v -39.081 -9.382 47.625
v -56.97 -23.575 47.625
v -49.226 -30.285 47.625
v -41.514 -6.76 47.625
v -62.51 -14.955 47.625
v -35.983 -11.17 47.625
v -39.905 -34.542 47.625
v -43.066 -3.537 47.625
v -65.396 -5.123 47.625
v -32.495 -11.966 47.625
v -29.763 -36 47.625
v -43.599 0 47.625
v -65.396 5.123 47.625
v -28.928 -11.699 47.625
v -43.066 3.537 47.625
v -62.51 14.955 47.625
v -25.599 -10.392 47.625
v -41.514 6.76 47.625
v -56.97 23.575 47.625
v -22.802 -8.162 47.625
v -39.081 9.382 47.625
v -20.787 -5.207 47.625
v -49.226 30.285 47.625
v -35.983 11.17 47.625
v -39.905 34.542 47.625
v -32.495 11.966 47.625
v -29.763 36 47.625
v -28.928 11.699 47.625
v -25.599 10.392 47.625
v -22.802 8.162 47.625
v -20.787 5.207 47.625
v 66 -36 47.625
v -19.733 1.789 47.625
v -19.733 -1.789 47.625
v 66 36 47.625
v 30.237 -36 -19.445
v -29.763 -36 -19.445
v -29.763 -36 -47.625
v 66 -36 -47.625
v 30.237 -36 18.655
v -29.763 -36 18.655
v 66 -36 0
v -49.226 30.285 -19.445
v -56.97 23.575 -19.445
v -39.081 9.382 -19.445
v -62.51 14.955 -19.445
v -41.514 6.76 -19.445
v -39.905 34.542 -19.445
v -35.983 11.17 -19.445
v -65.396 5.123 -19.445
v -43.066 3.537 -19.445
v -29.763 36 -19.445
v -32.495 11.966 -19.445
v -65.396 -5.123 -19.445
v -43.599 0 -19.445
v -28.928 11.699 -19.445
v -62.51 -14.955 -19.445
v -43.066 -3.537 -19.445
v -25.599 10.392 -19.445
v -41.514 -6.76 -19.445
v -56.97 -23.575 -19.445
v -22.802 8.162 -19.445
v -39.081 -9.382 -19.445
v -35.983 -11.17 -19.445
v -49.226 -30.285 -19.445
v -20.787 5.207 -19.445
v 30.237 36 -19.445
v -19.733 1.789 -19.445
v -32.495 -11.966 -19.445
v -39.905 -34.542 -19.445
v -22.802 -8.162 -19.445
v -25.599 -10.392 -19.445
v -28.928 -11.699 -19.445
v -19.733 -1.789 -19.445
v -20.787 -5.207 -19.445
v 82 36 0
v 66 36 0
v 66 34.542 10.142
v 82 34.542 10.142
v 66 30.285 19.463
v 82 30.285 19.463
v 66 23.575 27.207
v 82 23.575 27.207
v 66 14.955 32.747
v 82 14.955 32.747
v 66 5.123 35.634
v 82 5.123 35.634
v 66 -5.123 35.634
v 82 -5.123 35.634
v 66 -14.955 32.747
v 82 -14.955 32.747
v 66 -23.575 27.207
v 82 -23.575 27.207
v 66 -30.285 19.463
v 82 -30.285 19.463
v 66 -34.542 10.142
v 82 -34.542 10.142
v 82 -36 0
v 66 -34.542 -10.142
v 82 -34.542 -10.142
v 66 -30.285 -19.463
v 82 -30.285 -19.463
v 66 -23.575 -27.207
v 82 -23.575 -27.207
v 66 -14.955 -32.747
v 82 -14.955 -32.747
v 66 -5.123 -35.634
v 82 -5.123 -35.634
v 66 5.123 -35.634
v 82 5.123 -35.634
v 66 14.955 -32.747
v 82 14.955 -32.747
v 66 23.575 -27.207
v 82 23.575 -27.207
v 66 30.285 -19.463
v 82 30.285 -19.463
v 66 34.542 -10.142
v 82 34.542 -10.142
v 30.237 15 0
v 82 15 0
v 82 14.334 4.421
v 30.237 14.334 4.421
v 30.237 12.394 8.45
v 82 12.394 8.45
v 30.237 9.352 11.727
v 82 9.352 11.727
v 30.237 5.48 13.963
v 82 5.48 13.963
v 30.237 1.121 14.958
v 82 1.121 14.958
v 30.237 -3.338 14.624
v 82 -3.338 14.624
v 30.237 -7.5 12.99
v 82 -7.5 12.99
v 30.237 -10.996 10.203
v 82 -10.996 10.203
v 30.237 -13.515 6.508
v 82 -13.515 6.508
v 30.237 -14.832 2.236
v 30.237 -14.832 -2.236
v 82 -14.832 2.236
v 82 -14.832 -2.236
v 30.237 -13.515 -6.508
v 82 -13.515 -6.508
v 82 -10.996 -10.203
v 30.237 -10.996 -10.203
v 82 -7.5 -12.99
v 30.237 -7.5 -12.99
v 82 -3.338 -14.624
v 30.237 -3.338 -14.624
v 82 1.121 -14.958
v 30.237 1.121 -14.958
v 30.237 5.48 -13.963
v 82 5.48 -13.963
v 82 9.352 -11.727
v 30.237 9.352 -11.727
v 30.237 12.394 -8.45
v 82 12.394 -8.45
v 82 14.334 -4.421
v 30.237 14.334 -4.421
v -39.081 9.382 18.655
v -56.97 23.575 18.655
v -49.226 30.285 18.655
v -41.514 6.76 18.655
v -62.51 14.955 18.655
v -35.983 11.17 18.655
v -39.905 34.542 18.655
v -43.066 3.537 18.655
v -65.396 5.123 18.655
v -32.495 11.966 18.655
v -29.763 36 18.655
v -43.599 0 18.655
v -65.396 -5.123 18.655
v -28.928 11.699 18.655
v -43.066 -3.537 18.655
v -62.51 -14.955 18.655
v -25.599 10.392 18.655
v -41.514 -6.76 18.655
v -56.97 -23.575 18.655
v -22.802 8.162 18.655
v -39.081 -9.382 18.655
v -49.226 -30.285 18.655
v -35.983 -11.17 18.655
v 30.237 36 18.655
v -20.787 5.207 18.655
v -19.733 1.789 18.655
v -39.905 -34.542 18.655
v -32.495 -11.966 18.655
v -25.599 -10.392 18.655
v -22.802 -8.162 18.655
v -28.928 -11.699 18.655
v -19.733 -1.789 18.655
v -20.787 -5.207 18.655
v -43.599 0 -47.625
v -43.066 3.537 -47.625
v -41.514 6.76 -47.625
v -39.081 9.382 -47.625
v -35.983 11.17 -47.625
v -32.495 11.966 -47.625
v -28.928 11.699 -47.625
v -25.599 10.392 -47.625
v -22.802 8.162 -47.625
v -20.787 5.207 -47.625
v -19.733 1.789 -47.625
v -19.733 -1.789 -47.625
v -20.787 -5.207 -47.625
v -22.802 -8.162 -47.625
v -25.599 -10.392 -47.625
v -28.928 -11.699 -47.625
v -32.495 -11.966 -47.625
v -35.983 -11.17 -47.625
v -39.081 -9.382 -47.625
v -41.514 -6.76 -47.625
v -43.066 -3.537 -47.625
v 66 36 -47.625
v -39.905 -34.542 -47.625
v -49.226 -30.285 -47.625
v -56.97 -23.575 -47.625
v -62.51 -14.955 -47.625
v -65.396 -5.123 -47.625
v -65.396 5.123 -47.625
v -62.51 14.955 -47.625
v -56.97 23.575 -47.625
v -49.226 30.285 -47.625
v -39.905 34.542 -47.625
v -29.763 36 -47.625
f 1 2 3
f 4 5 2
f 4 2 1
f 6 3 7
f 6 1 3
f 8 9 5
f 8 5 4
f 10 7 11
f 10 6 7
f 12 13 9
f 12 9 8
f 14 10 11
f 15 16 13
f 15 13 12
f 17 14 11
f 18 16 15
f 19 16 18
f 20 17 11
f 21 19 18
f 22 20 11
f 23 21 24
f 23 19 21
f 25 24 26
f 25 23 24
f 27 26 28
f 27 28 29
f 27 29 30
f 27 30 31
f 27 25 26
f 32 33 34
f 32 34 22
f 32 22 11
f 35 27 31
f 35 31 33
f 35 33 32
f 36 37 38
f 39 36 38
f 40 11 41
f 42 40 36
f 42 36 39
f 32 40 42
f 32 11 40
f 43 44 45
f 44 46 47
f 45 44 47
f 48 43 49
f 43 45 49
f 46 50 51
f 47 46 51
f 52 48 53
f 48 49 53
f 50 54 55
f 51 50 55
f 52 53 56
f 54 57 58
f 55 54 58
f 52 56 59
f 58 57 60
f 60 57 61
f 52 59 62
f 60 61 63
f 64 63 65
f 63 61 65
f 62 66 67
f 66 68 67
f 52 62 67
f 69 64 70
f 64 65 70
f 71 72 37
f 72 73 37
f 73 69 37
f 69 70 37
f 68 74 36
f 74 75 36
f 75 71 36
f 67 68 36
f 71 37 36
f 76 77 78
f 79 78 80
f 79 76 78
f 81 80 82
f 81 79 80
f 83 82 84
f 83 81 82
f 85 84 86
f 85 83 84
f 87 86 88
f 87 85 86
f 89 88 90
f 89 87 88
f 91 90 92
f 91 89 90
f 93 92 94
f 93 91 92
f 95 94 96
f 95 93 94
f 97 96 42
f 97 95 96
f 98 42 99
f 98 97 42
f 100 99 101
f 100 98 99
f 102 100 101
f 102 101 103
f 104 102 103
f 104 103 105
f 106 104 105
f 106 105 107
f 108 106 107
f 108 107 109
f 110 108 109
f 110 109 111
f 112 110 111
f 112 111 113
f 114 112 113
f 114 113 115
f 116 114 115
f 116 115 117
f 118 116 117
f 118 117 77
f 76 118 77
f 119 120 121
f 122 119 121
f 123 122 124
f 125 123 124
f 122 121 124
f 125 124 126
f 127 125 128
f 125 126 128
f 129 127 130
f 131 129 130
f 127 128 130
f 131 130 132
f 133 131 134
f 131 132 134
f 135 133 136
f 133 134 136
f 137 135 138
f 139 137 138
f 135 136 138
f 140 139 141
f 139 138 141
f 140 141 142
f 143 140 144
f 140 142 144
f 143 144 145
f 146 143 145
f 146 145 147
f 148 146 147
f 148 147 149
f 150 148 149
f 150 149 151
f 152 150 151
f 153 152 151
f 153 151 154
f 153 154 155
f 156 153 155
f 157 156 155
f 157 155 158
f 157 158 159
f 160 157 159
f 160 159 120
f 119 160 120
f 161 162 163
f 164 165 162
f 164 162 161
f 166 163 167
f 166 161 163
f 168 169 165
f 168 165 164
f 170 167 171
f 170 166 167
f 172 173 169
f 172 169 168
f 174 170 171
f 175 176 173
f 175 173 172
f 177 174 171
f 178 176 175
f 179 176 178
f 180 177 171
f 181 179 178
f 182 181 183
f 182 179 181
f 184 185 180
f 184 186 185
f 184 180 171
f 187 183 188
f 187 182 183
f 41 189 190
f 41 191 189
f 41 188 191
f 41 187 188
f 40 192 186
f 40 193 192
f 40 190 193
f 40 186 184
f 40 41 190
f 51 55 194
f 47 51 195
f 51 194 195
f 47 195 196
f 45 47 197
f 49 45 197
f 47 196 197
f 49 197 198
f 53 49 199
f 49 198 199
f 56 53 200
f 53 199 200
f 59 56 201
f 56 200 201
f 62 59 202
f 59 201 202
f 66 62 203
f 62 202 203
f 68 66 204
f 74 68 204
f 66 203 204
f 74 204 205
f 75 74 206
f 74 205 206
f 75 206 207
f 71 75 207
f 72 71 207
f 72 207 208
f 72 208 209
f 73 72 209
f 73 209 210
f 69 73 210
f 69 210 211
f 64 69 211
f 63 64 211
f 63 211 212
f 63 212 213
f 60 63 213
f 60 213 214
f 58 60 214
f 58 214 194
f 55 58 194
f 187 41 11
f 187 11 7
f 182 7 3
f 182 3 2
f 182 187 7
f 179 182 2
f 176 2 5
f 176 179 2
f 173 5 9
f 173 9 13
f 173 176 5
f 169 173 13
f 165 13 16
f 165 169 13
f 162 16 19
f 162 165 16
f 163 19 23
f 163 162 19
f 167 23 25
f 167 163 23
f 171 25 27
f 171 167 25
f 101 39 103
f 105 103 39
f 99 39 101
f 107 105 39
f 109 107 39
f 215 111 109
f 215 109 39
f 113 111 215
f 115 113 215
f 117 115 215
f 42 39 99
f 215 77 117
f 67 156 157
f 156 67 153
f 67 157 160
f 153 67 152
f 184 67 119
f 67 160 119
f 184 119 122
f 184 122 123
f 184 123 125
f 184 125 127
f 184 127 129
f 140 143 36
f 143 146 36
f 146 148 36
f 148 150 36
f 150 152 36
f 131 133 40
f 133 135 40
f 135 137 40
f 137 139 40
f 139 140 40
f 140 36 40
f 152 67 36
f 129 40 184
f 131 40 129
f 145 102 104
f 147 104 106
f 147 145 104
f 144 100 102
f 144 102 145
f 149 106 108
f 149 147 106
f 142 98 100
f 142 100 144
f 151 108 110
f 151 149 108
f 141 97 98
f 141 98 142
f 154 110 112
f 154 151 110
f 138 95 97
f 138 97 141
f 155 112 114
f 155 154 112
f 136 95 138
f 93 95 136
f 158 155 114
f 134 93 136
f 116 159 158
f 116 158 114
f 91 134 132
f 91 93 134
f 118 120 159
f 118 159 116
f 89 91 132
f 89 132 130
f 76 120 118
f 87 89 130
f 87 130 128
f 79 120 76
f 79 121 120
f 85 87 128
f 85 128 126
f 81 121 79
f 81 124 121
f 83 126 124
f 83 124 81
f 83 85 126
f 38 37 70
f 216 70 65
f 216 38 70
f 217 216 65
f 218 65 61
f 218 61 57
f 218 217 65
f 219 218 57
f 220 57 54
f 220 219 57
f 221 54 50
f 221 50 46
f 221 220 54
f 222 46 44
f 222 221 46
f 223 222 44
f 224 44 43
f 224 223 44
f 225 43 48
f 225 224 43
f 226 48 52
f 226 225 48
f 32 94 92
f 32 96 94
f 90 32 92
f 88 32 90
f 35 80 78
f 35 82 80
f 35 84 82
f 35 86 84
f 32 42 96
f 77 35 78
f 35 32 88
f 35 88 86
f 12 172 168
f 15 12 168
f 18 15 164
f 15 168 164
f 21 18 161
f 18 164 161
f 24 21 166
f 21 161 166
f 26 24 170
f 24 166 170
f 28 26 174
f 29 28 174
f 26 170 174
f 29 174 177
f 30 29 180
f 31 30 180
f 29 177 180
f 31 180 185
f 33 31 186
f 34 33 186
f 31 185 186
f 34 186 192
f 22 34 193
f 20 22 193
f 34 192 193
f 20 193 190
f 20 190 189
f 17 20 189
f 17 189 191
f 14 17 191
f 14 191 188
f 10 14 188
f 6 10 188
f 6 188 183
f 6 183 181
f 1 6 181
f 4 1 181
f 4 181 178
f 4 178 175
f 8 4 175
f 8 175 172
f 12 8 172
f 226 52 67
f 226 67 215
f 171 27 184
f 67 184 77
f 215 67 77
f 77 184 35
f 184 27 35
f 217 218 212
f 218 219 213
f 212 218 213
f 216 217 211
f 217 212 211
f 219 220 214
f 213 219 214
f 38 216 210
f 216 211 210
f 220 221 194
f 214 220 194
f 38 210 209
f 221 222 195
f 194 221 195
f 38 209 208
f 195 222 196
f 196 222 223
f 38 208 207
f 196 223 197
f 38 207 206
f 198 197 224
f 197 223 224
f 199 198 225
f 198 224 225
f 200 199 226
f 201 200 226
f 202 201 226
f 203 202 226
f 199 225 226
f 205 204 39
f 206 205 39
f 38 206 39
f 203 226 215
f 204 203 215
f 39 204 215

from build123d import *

# Parameters (mm, degrees)
SKETCH1_W           = 132
SKETCH1_H           = 72
BOSS_EXTRUDE1_DEPTH = 47.625
CUT_EXTRUDE1_START  = -95.25
CUT_EXTRUDE1_DEPTH  = 95.25
SKETCH3_W           = 96
SKETCH3_H           = 38.1
CUT_EXTRUDE2_DEPTH  = 109.665268715
SKETCH4_R           = 15
CUT_EXTRUDE3_DEPTH  = 145.656822687
BOSS_EXTRUDE2_START = 16
SKETCH5_R           = 36
SKETCH5_R_2         = 15
BOSS_EXTRUDE2_DEPTH = 16
SKETCH6_R           = 12
CUT_EXTRUDE4_DEPTH  = 131.738527221


# Read off the part's stored shape, not the designer's step: Cut-Extrude1
with BuildPart() as part:
    # Sketch1 → Boss-Extrude1 (new, symmetric)
    with BuildSketch(Plane.XY):
        Rectangle(SKETCH1_W, SKETCH1_H)
    extrude(amount=BOSS_EXTRUDE1_DEPTH, both=True)

    # Cut-Extrude1 outline → Cut-Extrude1 (cut)
    with BuildSketch(Plane.XY.offset(47.625).offset(CUT_EXTRUDE1_START)):
        with BuildLine():
            Line((-66, -36), (-29.762876885, -36))
            ThreePointArc((-29.762876885, -36), (-65.762876885, 0), (-29.762876885, 36))
            Line((-29.762876885, 36), (-66, 36))
            Line((-66, 36), (-66, -36))
        make_face()
    extrude(amount=CUT_EXTRUDE1_DEPTH, mode=Mode.SUBTRACT)

    # Sketch3 → Cut-Extrude2 (cut, through all)
    with BuildSketch(Plane.XZ.offset(36)):
        with Locations((-17.762876885, -0.395)):
            Rectangle(SKETCH3_W, SKETCH3_H)
    extrude(amount=-CUT_EXTRUDE2_DEPTH, mode=Mode.SUBTRACT)

    # Sketch4 → Cut-Extrude3 (cut, through all)
    with BuildSketch(Plane(origin=(66, 0, 0), x_dir=(0, 0, -1), z_dir=(1, 0, 0))):
        with Locations(Location((0, 0, 0), (0, 0, 90))):
            Circle(SKETCH4_R)
    extrude(amount=-CUT_EXTRUDE3_DEPTH, mode=Mode.SUBTRACT)

    # Sketch5 → Boss-Extrude2 (add)
    with BuildSketch(Plane(origin=(66, 0, 0), x_dir=(0, 0, -1), z_dir=(1, 0, 0)).offset(BOSS_EXTRUDE2_START)):
        with Locations(Location((0, 0, 0), (0, 0, 90))):
            Circle(SKETCH5_R)
        with Locations(Location((0, 0, 0), (0, 0, 90))):
            Circle(SKETCH5_R_2, mode=Mode.SUBTRACT)
    extrude(amount=-BOSS_EXTRUDE2_DEPTH)

    # Sketch6 → Cut-Extrude4 (cut, through all)
    with BuildSketch(Plane(origin=(0, 0, -47.625), x_dir=(-1, 0, 0), z_dir=(0, 0, -1))):
        with Locations((31.598726765, 0)):
            Circle(SKETCH6_R)
    extrude(amount=-CUT_EXTRUDE4_DEPTH, mode=Mode.SUBTRACT)


solid = part.part
